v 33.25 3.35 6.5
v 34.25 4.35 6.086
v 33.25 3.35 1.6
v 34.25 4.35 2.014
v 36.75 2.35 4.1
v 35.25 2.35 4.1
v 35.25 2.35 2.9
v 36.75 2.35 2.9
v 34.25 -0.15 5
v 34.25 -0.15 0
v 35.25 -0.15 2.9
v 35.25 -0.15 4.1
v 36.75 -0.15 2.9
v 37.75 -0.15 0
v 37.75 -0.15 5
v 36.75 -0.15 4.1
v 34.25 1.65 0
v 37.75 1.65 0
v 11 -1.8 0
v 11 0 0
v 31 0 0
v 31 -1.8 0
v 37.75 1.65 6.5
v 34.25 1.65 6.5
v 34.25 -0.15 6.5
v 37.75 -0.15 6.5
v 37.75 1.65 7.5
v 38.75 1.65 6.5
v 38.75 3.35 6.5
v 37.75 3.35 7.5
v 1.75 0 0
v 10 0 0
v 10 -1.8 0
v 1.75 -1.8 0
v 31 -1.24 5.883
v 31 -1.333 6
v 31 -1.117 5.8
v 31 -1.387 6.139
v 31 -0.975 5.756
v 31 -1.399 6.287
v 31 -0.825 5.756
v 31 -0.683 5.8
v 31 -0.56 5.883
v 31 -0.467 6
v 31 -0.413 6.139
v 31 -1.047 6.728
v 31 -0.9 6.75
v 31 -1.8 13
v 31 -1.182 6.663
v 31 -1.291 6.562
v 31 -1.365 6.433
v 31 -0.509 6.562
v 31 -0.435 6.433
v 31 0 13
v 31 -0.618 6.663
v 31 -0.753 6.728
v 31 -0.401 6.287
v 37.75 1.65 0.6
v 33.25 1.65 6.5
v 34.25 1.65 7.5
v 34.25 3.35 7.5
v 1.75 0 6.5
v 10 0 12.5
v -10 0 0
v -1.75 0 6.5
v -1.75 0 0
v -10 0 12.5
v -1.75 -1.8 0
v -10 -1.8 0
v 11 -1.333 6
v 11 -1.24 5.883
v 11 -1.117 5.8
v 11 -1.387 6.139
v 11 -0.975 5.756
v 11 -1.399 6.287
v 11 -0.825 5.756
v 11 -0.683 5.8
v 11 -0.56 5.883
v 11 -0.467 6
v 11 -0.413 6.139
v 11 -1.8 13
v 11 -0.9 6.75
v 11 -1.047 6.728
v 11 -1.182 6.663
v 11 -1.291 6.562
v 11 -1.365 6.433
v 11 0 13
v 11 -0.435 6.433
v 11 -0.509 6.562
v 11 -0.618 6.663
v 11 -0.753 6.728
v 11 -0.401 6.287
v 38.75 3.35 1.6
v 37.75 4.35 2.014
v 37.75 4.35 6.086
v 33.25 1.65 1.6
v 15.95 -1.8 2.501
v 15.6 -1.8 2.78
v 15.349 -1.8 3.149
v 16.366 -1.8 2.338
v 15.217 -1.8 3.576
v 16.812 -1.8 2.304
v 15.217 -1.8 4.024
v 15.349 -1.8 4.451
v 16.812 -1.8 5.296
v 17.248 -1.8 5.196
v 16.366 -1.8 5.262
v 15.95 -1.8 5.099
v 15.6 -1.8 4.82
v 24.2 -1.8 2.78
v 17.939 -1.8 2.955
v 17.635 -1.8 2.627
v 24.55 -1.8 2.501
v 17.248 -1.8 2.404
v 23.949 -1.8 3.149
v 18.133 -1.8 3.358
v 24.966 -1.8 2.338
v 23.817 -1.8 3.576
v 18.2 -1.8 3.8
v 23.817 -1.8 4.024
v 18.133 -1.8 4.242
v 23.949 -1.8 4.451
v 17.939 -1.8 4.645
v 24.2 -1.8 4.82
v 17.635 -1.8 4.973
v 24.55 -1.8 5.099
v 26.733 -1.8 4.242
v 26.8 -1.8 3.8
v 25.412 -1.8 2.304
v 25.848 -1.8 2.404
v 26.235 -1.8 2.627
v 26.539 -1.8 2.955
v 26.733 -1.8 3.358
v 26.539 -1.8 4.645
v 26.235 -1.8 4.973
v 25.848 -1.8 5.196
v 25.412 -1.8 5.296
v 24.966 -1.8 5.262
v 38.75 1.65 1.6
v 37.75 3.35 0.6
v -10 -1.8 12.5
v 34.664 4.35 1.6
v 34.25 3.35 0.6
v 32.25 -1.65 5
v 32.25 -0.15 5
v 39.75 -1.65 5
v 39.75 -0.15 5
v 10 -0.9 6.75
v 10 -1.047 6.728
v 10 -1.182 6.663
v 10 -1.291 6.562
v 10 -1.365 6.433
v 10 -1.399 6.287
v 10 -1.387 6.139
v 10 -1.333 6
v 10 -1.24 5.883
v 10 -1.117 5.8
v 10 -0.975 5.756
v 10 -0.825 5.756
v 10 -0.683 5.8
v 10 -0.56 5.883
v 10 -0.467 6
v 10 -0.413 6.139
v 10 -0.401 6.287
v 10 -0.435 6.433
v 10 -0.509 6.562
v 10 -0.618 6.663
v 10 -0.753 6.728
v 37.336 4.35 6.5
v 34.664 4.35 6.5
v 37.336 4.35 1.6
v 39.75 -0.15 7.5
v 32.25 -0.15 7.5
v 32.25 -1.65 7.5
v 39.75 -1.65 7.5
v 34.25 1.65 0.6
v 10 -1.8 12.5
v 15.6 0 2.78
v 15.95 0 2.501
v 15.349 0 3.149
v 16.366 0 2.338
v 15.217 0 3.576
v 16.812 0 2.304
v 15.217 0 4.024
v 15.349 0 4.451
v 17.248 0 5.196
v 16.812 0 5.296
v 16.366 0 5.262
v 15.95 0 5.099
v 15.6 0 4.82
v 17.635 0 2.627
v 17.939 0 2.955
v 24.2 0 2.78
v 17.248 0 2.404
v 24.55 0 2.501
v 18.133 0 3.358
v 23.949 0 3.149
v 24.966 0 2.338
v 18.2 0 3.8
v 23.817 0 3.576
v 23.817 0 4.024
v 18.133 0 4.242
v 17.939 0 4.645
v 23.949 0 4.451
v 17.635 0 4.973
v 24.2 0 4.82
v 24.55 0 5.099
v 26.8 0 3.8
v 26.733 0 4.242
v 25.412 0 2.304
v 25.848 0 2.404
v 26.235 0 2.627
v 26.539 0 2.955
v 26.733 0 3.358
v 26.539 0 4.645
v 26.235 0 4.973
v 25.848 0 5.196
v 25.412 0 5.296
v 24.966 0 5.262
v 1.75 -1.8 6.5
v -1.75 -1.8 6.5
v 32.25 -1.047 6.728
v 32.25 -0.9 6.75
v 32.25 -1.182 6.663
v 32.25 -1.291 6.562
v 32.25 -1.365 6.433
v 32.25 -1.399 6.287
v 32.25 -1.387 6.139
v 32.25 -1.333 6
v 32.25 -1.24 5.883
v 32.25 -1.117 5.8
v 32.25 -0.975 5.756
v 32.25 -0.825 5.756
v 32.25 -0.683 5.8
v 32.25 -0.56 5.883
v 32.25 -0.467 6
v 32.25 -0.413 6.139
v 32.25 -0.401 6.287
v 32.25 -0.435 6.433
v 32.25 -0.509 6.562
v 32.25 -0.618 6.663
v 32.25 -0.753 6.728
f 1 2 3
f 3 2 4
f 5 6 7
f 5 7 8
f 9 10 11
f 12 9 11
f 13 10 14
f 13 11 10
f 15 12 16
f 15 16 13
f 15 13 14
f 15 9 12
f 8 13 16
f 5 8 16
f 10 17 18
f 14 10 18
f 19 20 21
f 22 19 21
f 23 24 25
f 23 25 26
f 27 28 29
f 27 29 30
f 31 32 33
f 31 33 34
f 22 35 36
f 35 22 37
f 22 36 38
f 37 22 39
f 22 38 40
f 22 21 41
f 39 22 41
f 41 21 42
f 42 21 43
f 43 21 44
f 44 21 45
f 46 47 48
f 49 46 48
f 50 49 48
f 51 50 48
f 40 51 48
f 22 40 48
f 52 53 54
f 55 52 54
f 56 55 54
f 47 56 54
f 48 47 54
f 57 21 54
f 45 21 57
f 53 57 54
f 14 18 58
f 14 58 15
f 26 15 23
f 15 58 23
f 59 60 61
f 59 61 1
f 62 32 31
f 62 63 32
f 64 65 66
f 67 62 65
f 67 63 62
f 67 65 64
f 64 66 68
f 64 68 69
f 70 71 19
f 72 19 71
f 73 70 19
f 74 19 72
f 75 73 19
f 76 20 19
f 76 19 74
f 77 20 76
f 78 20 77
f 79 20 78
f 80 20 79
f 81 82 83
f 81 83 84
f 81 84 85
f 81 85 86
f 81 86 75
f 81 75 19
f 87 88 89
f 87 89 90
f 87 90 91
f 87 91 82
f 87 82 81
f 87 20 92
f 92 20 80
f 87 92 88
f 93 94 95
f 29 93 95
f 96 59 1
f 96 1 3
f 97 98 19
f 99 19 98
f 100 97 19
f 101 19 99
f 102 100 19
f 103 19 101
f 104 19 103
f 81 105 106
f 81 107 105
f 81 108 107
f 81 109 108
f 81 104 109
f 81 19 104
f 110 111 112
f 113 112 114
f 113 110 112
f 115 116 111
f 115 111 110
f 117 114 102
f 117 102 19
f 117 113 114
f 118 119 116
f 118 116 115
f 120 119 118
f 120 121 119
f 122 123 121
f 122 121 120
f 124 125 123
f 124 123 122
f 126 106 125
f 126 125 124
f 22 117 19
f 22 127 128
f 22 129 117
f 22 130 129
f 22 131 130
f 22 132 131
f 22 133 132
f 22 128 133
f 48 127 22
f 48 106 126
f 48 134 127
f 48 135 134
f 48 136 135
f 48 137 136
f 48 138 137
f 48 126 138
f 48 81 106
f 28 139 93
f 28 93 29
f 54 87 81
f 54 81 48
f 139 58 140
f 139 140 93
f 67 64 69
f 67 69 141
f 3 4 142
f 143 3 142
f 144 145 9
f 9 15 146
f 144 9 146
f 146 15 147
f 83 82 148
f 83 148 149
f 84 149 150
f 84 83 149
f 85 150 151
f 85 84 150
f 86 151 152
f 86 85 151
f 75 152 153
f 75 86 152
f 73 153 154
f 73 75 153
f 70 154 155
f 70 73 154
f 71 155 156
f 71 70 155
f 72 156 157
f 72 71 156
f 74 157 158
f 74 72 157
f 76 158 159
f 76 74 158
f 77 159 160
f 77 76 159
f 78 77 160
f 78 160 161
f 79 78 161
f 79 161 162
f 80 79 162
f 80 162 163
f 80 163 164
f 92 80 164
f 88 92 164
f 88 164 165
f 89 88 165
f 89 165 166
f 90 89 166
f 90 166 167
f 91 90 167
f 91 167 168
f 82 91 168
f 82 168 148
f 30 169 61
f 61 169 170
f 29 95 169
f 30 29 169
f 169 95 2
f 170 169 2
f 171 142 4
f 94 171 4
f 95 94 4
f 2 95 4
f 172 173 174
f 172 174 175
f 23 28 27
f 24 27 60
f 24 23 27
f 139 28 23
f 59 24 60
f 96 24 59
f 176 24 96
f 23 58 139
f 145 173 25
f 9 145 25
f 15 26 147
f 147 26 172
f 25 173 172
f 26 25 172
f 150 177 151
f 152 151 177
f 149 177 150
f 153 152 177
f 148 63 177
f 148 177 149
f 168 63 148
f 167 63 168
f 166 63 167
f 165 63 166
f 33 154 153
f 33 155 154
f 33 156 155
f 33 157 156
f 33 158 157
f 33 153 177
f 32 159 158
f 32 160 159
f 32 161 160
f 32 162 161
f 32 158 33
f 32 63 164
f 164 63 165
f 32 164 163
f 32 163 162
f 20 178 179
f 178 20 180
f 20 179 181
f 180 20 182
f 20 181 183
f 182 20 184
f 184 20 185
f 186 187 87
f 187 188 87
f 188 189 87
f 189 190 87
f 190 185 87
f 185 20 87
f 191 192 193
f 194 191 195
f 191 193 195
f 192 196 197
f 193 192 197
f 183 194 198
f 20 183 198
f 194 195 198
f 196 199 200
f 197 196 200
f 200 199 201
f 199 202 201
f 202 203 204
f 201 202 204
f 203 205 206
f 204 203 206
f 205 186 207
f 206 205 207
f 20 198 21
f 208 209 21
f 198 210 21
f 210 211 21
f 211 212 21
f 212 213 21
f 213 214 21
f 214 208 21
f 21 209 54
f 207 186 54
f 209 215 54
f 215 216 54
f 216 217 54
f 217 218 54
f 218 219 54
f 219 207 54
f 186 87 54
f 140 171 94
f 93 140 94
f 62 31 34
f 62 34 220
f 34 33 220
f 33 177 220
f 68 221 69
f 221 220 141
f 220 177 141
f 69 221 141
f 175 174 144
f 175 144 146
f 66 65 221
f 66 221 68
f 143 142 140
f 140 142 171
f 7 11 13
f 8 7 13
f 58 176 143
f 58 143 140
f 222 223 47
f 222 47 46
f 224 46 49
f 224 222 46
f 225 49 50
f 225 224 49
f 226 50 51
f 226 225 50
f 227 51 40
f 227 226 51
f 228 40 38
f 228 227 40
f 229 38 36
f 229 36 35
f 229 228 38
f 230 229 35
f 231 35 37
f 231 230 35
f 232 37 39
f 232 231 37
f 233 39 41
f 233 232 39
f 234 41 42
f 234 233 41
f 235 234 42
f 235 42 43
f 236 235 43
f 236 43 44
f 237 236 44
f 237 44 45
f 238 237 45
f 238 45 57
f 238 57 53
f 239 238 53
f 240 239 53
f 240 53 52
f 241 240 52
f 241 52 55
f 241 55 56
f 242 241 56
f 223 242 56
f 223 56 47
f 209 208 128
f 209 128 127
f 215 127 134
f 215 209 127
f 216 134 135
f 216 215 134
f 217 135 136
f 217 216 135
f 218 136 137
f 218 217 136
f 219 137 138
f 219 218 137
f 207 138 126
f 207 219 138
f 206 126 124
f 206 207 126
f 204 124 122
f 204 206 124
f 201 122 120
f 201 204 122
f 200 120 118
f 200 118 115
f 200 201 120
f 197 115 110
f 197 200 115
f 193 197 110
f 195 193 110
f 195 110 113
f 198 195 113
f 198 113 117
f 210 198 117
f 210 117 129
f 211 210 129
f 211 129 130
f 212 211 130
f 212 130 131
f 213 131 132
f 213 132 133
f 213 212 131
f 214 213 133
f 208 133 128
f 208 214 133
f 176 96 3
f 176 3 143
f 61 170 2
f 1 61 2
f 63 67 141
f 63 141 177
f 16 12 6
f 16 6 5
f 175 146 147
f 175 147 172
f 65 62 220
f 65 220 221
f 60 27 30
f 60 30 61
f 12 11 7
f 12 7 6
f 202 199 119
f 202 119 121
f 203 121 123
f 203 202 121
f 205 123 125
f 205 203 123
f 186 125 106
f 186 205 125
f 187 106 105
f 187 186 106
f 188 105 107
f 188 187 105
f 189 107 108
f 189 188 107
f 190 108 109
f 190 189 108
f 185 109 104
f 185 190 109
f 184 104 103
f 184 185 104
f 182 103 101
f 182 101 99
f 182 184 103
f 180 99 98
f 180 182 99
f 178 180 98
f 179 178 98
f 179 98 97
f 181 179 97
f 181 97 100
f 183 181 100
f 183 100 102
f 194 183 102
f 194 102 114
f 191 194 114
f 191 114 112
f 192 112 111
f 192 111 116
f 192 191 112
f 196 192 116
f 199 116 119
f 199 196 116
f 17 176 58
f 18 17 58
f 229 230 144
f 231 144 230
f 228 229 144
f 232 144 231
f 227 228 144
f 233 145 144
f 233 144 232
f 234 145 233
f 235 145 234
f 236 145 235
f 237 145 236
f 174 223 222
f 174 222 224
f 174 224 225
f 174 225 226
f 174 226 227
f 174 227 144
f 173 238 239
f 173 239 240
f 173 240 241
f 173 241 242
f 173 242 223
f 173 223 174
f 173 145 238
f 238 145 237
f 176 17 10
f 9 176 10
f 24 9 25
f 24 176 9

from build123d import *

# Parameters (mm, degrees)
SKETCH_W     = 3.5
SKETCH_H     = 6.5
PAD002_DEPTH = 1.8
PAD003_DEPTH = 2.7
SKETCH004_W  = 1.5
SKETCH004_H  = 1.2
POCKET_DEPTH = 2.5
SKETCH005_W  = 7.5
SKETCH005_H  = 2.5
PAD004_DEPTH = 1.5
CHAMFER_SIZE = 1
SKETCH006_R  = 0.5
PAD005_DEPTH = 30
PAD001_DEPTH = 1.8
SKETCH002_W  = 20
SKETCH002_H  = 13
SKETCH002_R  = 1.5
PAD_DEPTH    = 1.8


with BuildPart() as pad005:
    # Sketch → Pad002 (new body)
    with BuildSketch(Plane(origin=(36, 1.65, 0), x_dir=(1, 0, 0), z_dir=(0, -1, 0))):
        with Locations((0, 3.25)):
            Rectangle(SKETCH_W, SKETCH_H)
    extrude(amount=PAD002_DEPTH)

    # Sketch003 → Pad003 (new body)
    with BuildSketch(Plane(origin=(36, 1.65, 0), x_dir=(1, 0, 0), z_dir=(0, 1, 0))):
        Polygon((-1.75, -0.6), (1.75, -0.6), (2.75, -1.6), (2.75, -6.5), (1.75, -7.5), (-1.75, -7.5), (-2.75, -6.5), (-2.75, -1.6), align=None)
    extrude(amount=PAD003_DEPTH)

    # Sketch004 → Pocket (cut)
    with BuildSketch(Plane(origin=(36, -0.15, 0), x_dir=(1, 0, 0), z_dir=(0, -1, 0))):
        with Locations((0, 3.5)):
            Rectangle(SKETCH004_W, SKETCH004_H)
    extrude(amount=-POCKET_DEPTH, mode=Mode.SUBTRACT)

    # Sketch005 → Pad004 (new body)
    with BuildSketch(Plane(origin=(36, -0.15, 0), x_dir=(1, 0, 0), z_dir=(0, -1, 0))):
        with Locations((0, 6.25)):
            Rectangle(SKETCH005_W, SKETCH005_H)
    extrude(amount=PAD004_DEPTH)

    # Chamfer
    chamfer_edges = [pad005.edges().sort_by_distance(p)[0] for p in [
        (33.25, 4.35, 4.05),
        (33.75, 4.35, 1.1),
        (36, 4.35, 0.6),
        (38.25, 4.35, 1.1),
        (38.75, 4.35, 4.05),
        (38.25, 4.35, 7),
        (36, 4.35, 7.5),
        (33.75, 4.35, 7),
    ]]
    chamfer(chamfer_edges, length=CHAMFER_SIZE)

    # Sketch006 → Pad005 (new body)
    with BuildSketch(Plane(origin=(39.75, 1.65, 0), x_dir=(0, 0, 1), z_dir=(1, 0, 0))):
        with Locations((6.25, 2.55)):
            Circle(SKETCH006_R)
    extrude(amount=-PAD005_DEPTH)


with BuildPart() as padcover:
    # Sketch001 → Pad001 (new body)
    with BuildSketch(Plane.XZ):
        Polygon((10, 0), (1.75, 0), (1.75, 6.5), (-1.75, 6.5), (-1.75, 0), (-10, 0), (-10, 12.5), (10, 12.5), align=None)
    extrude(amount=PAD001_DEPTH)


with BuildPart() as fusion:
    # Sketch002 → Pad (new body)
    with BuildSketch(Plane(origin=(21, 0, 0), x_dir=(1, 0, 0), z_dir=(0, -1, 0))):
        with Locations((0, 6.5)):
            Rectangle(SKETCH002_W, SKETCH002_H)
        with Locations((-4.3, 3.8)):
            Circle(SKETCH002_R, mode=Mode.SUBTRACT)
        with Locations((4.3, 3.8)):
            Circle(SKETCH002_R, mode=Mode.SUBTRACT)
    extrude(amount=PAD_DEPTH)

    # Fusion: union Pad005, PadCover
    add(pad005.part)
    add(padcover.part)


solid = fusion.part
